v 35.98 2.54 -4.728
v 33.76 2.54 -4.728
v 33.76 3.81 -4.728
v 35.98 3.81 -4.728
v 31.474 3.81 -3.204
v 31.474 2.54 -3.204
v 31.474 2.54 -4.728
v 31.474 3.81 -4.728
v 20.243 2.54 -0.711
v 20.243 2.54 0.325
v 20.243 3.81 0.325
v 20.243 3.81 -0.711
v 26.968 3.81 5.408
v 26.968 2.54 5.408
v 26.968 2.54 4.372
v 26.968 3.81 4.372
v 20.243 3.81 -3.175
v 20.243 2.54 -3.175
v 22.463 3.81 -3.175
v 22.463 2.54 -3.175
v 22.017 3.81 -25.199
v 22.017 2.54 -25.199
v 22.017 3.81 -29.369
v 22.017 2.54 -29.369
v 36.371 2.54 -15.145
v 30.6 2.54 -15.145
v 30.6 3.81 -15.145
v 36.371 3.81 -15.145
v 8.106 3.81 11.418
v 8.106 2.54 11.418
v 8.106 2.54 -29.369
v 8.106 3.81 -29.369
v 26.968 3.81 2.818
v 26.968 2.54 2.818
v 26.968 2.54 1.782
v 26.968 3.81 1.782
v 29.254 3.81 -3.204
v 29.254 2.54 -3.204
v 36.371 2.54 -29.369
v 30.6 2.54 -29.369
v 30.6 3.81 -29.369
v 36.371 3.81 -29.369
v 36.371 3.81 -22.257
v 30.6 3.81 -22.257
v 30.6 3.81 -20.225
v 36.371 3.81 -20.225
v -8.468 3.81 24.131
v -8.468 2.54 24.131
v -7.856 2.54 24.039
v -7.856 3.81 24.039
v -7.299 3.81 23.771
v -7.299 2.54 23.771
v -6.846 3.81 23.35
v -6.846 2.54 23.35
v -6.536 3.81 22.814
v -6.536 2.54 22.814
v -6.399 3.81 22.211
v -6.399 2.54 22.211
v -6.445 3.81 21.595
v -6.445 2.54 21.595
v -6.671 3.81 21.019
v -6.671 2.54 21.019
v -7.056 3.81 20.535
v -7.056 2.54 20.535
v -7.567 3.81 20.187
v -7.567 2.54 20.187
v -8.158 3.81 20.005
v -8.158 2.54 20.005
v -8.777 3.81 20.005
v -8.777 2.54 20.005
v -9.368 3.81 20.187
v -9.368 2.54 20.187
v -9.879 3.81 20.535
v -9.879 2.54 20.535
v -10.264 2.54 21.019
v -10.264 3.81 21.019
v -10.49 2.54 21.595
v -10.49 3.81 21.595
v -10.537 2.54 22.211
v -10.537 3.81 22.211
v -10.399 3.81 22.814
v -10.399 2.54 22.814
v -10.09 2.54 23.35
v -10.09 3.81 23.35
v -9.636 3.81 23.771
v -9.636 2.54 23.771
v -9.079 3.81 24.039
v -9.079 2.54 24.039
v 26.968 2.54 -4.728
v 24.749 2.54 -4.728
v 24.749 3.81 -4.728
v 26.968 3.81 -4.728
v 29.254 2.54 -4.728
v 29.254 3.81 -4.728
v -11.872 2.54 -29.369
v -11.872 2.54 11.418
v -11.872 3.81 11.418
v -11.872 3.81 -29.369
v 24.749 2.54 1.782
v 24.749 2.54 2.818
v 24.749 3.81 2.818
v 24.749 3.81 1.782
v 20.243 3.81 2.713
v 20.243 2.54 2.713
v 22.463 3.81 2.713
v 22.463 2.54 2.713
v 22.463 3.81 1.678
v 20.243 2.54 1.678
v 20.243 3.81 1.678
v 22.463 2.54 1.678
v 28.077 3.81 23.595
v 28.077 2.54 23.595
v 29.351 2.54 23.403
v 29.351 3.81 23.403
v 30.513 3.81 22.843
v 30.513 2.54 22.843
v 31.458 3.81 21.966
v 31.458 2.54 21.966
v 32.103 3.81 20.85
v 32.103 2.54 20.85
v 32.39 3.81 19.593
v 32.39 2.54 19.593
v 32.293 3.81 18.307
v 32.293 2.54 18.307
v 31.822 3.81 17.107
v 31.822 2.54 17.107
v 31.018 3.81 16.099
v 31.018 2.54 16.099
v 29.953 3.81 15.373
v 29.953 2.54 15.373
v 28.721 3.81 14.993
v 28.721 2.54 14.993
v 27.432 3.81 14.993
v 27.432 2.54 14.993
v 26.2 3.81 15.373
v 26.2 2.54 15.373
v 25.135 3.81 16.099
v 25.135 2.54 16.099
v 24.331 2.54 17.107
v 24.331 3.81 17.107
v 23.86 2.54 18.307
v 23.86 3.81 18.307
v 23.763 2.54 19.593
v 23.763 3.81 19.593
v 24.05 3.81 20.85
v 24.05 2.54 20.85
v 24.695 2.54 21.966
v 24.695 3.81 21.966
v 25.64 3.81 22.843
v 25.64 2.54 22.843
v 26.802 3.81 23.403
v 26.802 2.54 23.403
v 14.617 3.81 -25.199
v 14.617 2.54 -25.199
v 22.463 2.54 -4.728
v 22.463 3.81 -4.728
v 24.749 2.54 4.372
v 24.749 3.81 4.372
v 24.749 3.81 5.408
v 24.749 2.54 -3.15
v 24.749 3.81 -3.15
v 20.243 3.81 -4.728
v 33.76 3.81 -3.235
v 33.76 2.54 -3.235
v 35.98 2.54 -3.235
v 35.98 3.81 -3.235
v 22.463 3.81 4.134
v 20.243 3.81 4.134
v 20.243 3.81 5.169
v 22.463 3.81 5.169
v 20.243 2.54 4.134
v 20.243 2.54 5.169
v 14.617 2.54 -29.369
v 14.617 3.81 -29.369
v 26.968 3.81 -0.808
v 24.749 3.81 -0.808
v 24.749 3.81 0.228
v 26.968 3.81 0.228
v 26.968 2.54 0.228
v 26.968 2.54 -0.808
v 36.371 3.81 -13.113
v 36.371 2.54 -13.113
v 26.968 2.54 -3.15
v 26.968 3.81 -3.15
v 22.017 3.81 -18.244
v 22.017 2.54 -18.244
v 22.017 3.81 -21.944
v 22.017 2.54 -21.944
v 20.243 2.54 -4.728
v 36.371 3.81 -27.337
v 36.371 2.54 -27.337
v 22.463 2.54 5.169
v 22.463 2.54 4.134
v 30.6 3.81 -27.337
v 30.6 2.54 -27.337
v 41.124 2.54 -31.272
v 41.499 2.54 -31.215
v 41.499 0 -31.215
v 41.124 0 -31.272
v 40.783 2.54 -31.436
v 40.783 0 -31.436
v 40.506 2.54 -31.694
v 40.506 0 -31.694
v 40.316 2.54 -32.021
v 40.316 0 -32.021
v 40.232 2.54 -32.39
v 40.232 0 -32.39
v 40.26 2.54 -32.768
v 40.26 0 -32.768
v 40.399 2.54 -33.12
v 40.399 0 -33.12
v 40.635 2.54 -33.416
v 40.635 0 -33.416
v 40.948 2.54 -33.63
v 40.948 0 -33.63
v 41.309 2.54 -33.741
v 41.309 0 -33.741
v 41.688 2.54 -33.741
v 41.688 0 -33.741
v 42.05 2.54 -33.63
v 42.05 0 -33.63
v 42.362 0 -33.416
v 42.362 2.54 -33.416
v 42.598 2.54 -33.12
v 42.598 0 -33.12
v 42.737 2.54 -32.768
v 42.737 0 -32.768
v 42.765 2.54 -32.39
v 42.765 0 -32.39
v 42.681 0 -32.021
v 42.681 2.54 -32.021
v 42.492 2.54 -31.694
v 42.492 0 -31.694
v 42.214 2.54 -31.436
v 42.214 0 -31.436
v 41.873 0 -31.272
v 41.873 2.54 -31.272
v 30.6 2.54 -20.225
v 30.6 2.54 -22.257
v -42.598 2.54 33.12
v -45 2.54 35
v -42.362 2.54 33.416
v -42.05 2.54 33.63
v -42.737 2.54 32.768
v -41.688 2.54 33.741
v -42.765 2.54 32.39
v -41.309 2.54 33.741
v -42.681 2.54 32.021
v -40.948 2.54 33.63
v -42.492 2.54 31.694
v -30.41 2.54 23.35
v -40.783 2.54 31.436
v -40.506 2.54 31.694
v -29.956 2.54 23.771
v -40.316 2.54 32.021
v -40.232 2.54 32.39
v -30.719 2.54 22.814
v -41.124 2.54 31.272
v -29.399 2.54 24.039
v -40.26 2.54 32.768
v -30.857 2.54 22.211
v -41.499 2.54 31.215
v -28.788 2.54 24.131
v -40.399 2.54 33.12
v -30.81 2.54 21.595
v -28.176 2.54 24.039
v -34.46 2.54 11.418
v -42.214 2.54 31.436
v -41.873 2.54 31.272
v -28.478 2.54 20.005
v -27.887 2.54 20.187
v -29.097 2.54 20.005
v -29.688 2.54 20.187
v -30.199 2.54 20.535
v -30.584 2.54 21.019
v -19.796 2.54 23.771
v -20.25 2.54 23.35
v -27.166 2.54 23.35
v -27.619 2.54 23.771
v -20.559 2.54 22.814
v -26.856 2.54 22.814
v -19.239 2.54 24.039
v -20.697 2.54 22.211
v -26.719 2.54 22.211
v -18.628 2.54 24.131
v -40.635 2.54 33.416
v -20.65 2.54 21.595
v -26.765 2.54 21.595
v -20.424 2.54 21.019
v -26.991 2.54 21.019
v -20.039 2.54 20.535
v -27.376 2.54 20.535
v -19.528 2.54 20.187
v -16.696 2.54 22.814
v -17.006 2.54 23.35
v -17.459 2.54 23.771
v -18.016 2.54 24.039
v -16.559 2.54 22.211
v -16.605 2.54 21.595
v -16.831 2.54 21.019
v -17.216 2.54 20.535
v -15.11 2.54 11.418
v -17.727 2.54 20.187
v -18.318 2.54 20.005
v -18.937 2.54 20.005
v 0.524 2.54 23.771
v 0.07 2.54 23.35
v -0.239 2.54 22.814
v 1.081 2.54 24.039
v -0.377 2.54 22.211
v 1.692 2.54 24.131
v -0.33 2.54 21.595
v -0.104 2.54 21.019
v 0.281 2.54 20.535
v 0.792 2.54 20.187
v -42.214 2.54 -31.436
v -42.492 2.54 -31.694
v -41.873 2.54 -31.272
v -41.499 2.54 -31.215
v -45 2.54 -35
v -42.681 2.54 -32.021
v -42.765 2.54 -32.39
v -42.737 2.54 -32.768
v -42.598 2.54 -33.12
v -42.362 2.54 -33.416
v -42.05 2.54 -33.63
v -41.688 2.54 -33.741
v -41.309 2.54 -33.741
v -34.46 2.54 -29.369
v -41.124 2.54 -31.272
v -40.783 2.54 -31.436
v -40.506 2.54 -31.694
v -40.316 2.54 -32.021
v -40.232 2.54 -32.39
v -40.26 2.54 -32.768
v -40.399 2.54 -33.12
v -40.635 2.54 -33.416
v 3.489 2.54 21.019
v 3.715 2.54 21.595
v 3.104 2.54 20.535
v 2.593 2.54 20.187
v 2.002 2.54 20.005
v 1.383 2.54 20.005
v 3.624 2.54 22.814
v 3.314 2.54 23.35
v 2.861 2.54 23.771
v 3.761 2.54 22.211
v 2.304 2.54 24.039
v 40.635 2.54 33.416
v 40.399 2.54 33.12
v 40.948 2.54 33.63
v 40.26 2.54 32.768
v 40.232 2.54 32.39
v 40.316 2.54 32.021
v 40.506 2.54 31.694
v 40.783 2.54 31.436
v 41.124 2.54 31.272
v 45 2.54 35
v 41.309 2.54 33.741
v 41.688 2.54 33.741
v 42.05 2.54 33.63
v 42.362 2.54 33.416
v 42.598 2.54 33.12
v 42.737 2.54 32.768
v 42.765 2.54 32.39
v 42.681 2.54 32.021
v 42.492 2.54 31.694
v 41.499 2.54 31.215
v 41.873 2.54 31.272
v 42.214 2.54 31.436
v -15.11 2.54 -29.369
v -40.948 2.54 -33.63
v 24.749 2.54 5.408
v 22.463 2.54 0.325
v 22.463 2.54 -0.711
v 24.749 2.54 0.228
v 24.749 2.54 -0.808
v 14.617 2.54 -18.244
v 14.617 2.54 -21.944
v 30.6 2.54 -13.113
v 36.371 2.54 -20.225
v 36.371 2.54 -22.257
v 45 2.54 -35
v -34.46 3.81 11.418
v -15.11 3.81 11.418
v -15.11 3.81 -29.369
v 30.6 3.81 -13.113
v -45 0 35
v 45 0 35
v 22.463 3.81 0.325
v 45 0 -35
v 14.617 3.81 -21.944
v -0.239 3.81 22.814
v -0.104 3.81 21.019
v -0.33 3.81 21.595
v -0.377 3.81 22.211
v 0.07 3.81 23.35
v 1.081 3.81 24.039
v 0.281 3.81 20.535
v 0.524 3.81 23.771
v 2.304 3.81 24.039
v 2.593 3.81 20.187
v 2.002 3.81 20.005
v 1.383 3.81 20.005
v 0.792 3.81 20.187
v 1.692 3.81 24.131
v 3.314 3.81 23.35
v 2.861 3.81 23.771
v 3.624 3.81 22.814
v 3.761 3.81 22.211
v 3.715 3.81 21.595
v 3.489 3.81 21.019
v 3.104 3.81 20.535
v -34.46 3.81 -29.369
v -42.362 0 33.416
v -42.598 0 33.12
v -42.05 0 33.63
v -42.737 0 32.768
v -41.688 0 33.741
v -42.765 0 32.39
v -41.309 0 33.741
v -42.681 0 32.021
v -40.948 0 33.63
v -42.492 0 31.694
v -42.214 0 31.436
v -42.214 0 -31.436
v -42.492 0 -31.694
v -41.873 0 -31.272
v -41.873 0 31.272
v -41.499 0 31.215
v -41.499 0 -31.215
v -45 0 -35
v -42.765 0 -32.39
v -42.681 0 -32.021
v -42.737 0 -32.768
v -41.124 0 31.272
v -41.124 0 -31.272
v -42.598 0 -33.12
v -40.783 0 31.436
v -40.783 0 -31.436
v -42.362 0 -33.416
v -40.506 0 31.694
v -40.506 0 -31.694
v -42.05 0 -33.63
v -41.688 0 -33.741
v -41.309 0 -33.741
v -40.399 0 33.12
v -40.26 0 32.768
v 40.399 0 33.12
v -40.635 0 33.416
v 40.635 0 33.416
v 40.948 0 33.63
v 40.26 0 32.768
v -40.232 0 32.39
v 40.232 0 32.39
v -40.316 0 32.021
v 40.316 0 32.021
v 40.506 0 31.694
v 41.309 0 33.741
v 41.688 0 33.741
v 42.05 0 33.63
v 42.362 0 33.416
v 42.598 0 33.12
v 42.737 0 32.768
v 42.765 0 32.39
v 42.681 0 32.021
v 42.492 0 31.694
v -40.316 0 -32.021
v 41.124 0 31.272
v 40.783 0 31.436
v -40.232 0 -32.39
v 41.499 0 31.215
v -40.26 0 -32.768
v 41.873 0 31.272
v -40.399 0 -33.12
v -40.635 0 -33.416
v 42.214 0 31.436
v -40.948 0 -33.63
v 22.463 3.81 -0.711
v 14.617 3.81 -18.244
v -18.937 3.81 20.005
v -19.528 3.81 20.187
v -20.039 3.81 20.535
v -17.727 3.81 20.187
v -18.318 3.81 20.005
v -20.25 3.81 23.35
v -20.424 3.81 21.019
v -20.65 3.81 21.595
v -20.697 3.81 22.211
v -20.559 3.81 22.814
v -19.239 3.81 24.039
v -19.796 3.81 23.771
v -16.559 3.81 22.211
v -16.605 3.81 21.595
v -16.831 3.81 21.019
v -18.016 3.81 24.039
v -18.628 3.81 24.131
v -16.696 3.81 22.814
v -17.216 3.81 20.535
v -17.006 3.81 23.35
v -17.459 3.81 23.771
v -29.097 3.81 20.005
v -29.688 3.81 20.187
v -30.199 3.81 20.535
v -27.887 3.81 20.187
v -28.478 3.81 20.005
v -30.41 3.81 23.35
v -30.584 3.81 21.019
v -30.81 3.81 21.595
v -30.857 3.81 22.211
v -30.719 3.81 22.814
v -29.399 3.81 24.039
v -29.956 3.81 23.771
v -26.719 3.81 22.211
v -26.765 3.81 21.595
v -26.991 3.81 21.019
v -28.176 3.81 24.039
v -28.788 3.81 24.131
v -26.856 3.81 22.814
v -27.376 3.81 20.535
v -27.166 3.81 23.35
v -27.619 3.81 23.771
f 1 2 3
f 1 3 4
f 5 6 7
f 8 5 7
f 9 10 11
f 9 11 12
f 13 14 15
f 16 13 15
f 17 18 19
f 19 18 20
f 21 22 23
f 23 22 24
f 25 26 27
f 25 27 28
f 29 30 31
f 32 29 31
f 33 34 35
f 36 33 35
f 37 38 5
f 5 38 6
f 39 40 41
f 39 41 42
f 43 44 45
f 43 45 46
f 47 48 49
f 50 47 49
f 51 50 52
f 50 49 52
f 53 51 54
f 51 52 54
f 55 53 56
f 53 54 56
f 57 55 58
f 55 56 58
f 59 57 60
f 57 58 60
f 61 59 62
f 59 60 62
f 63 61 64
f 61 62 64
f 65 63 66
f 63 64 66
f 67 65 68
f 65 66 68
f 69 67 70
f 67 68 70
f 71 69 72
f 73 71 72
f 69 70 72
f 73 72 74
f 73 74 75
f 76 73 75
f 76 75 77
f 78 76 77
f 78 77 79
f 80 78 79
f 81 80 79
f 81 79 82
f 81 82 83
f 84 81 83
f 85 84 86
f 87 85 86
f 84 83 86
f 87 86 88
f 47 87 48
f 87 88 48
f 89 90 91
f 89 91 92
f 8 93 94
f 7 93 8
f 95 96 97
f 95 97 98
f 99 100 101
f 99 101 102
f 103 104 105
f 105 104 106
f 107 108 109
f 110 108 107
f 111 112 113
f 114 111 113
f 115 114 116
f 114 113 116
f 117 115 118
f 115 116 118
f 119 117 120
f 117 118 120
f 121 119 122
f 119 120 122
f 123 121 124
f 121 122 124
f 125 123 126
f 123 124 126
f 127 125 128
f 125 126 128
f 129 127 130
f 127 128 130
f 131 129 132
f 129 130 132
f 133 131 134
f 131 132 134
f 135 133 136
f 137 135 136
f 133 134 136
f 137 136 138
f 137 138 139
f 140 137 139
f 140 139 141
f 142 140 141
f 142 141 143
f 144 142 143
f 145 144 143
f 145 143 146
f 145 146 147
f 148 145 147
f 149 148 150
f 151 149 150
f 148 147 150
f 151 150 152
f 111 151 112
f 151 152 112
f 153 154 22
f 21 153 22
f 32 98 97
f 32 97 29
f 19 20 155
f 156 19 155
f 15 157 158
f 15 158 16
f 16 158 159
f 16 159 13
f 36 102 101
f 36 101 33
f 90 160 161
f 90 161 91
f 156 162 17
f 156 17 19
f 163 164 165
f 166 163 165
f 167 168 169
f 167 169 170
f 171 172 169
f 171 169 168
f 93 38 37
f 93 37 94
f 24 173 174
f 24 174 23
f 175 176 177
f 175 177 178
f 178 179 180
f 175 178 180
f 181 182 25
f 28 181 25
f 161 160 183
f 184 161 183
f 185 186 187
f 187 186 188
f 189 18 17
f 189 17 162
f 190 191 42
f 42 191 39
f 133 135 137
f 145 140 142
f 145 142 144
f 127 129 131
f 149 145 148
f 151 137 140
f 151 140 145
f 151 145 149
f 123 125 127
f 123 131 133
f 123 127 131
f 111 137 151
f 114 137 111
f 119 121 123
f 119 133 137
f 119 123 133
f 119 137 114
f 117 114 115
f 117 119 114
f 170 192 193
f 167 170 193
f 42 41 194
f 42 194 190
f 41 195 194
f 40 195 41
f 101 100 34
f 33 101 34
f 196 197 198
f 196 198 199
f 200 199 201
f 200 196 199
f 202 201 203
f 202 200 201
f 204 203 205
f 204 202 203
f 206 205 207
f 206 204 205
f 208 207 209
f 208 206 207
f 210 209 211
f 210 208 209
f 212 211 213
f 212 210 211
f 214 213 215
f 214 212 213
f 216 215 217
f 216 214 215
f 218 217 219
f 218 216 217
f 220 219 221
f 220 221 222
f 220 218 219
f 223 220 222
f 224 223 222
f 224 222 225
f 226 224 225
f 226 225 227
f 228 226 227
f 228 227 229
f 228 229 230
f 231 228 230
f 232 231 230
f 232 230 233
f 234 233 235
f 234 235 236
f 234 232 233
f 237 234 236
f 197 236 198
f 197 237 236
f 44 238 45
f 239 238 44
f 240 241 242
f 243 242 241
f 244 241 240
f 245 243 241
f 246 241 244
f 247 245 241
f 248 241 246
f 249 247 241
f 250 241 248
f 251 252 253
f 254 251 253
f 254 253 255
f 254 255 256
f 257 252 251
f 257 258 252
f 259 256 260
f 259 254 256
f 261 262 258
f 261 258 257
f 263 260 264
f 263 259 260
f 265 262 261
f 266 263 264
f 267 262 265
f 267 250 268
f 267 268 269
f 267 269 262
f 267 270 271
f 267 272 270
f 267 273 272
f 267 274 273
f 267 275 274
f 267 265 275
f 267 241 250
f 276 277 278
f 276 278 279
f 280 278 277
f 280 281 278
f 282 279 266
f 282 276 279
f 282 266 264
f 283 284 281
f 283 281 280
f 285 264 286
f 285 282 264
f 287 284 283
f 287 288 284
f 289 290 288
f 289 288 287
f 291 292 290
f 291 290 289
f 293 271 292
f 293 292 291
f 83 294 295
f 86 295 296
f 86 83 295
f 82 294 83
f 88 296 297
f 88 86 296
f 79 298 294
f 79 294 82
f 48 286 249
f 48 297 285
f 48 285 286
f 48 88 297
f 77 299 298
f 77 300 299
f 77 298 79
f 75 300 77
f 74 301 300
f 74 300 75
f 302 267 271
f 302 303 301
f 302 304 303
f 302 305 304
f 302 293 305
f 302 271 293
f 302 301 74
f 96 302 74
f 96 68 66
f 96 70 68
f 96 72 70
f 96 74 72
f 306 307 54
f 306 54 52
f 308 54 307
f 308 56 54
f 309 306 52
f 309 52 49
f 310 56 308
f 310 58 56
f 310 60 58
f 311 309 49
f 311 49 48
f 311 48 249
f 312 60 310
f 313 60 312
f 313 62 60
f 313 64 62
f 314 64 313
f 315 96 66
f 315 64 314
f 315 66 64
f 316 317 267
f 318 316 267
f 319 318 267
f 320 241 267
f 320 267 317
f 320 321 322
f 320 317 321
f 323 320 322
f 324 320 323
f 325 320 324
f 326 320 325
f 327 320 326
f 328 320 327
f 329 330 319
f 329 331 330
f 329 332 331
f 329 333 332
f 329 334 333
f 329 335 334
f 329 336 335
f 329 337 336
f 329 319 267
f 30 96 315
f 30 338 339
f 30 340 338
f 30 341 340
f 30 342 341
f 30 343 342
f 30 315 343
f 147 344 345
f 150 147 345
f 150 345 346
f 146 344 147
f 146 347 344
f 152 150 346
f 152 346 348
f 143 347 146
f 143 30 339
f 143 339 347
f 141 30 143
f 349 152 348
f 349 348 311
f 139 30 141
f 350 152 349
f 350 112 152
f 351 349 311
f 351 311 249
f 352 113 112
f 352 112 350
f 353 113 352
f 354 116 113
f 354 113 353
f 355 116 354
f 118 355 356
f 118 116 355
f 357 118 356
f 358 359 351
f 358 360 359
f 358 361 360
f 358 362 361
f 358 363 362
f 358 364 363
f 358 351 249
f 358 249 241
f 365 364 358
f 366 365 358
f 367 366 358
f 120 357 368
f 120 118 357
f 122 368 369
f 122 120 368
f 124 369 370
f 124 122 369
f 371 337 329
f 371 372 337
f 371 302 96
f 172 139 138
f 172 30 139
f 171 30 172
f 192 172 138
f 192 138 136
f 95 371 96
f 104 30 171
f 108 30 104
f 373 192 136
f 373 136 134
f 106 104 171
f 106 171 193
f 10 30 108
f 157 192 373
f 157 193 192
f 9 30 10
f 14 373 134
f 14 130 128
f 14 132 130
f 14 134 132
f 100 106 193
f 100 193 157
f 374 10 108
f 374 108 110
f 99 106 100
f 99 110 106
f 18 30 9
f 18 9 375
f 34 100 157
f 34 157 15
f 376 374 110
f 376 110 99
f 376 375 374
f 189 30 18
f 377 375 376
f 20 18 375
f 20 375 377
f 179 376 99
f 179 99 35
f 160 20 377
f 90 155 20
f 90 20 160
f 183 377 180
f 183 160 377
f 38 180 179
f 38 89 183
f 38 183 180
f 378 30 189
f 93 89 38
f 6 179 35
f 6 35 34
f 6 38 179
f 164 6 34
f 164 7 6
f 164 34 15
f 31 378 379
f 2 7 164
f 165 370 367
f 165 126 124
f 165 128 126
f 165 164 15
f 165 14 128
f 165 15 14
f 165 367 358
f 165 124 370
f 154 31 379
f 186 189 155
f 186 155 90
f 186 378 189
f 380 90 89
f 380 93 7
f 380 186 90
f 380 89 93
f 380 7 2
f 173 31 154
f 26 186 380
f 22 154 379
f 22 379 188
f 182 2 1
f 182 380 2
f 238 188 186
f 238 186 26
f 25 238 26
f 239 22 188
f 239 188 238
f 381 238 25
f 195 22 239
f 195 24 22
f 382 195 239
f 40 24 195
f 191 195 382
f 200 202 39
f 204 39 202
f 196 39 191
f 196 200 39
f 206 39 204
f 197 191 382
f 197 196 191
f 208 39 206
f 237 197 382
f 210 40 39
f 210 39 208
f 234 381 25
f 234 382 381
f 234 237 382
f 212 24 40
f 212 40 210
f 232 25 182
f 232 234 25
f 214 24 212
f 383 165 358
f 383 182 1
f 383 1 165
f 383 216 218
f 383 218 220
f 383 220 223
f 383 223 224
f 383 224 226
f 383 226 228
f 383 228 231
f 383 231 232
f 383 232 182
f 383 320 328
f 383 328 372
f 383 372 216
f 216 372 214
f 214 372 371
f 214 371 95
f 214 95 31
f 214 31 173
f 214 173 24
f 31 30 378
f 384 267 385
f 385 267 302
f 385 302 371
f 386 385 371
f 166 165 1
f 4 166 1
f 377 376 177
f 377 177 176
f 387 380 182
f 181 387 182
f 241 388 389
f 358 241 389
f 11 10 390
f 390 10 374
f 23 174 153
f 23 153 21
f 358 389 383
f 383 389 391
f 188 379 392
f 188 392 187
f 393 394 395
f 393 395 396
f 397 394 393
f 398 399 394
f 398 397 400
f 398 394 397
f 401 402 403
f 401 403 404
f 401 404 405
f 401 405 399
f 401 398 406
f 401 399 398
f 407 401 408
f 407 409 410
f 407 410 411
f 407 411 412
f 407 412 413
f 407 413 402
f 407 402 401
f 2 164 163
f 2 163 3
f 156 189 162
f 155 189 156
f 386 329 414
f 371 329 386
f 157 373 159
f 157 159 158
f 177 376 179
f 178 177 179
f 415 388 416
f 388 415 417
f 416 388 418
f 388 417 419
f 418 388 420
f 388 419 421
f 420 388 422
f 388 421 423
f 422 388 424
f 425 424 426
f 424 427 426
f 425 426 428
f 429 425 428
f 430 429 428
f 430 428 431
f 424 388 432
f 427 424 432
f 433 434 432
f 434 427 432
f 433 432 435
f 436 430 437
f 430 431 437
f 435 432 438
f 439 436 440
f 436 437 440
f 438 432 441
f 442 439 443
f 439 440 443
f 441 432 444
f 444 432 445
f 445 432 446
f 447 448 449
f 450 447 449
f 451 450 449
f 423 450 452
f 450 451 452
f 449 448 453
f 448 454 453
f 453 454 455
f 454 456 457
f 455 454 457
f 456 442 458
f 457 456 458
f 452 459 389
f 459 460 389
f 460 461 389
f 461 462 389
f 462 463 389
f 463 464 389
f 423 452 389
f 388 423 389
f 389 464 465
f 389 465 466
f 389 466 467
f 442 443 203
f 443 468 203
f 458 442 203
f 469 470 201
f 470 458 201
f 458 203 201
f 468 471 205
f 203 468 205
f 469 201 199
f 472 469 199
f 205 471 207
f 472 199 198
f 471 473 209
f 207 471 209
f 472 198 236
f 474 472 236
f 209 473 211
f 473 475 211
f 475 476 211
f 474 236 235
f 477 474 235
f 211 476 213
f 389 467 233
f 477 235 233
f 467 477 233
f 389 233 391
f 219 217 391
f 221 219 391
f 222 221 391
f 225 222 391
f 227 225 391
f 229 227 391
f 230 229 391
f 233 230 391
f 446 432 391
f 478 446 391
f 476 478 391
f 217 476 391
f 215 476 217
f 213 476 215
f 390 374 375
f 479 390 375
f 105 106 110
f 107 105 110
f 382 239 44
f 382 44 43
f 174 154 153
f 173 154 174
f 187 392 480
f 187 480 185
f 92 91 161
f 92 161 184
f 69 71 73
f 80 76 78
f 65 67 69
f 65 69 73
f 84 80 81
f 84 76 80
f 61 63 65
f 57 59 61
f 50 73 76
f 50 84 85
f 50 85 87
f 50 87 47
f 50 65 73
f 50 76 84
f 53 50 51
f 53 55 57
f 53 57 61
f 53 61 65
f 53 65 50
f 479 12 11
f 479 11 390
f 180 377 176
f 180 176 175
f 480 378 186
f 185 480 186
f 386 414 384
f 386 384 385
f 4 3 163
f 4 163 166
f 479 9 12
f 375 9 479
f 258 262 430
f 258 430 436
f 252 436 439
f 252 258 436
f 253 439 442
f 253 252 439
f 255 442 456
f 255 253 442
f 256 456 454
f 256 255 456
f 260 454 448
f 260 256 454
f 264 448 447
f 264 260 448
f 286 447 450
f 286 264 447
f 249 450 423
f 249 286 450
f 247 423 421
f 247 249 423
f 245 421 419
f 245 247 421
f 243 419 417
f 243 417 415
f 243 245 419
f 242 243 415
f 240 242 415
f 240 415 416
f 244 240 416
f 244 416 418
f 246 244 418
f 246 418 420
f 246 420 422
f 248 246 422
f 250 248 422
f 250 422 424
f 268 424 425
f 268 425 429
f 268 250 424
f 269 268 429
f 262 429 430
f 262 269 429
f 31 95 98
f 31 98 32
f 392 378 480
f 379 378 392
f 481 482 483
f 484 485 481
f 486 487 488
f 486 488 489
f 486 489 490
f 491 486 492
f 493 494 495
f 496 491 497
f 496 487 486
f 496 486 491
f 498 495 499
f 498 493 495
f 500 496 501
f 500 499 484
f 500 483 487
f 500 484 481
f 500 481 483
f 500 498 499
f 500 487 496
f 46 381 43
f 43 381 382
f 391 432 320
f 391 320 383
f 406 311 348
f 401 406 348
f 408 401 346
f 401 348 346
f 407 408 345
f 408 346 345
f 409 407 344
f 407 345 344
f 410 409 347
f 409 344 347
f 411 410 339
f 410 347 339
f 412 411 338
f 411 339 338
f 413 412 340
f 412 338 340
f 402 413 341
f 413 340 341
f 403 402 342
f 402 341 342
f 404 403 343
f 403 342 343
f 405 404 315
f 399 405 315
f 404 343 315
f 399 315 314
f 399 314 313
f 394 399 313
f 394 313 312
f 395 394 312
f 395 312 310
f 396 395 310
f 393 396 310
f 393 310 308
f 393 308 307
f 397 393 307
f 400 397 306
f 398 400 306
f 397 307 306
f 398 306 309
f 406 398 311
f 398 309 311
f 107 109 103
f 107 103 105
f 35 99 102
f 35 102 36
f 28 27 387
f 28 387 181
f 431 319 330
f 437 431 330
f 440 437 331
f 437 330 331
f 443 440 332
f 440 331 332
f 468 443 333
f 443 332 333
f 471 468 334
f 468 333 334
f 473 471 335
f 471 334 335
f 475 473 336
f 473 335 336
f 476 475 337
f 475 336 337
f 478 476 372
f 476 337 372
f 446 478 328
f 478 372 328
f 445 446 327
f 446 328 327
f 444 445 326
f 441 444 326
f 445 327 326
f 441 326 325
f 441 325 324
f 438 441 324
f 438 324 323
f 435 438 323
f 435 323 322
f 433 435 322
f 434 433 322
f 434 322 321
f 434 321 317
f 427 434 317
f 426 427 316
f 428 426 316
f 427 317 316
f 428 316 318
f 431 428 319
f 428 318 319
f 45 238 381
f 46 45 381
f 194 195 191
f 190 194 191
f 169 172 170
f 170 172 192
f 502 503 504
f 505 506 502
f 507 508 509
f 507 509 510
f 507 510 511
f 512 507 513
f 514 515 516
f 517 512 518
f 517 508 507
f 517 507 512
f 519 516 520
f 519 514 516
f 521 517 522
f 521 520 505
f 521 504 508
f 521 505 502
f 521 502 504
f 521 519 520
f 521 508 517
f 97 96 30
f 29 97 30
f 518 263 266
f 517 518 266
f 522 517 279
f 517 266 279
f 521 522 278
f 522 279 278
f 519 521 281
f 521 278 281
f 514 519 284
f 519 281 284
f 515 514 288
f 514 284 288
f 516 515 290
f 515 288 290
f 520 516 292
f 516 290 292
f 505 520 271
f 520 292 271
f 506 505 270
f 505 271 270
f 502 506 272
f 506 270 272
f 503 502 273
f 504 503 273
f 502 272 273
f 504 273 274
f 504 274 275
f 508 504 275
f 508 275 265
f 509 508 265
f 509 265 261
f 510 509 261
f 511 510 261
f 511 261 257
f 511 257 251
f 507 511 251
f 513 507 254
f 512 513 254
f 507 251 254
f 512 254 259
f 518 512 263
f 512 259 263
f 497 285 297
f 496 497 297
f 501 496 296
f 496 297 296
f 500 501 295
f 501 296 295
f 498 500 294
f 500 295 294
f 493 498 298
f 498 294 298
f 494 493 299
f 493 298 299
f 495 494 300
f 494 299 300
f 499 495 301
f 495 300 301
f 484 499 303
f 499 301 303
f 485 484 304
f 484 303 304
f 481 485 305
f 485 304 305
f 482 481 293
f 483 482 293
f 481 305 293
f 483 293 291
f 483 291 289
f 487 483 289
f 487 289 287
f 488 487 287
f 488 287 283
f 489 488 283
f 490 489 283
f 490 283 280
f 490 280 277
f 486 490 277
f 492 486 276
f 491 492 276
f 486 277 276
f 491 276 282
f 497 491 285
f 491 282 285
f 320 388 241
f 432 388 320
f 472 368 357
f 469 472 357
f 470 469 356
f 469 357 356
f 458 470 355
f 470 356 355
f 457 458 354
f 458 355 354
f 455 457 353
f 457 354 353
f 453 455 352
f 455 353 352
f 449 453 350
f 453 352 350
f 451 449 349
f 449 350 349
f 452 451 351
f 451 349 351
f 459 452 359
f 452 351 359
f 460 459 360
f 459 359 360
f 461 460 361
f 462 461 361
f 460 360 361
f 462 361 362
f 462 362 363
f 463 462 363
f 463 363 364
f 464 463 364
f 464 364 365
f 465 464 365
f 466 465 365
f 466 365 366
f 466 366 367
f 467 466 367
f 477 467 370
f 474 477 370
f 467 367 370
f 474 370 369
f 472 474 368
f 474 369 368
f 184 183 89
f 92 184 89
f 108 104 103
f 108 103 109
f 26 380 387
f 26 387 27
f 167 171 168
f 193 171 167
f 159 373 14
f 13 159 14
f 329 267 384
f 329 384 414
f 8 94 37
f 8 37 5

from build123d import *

# Parameters (mm, degrees)
SKETCH1_W               = 90
SKETCH1_H               = 70
BOSS_EXTRUDE1_DEPTH     = 2.54
SKETCH2_R               = 2.074775273
SKETCH2_R_2             = 4.325167344
SKETCH2_W               = 2.219761911
SKETCH2_H               = 1.524543627
SKETCH2_W_2             = 19.349952437
SKETCH2_H_2             = 40.787411984
SKETCH2_W_3             = 19.977857201
SKETCH2_W_4             = 7.399206371
SKETCH2_H_3             = 4.17028531
SKETCH2_H_4             = 3.699603186
SKETCH2_W_5             = 5.771380969
SKETCH2_H_5             = 2.032
SKETCH2_H_6             = 1.035888892
SKETCH2_W_6             = 2.219761912
SKETCH2_H_7             = 1.578831572
SKETCH2_H_8             = 1.553833338
SKETCH2_H_9             = 1.493763587
BOSS_EXTRUDE2_DEPTH     = 1.27
SKETCH3_R               = 1.27
CUT_EXTRUDE1_DEPTH      = 2.54
MIRROR2_COPY_1_SKETCH_R = 1.27
MIRROR2_COPY_1_DEPTH    = 2.54


with BuildPart() as part:
    # Sketch1 → Boss-Extrude1 (new body)
    with BuildSketch(Plane(origin=(0, 0, 0), x_dir=(1, 0, 0), z_dir=(0, 1, 0))):
        Rectangle(SKETCH1_W, SKETCH1_H)
    extrude(amount=BOSS_EXTRUDE1_DEPTH)

    # Sketch2 → Boss-Extrude2 (add)
    with BuildSketch(Plane(origin=(0, 2.54, 0), x_dir=(1, 0, 0), z_dir=(0, 1, 0))):
        with Locations(Location((-28.787636227, -22.056380876, 0), (0, 0, 270))):
            Circle(SKETCH2_R)
        with Locations(Location((-18.627636227, -22.056380876, 0), (0, 0, 270))):
            Circle(SKETCH2_R)
        with Locations(Location((-8.467636227, -22.056380876, 0), (0, 0, 270))):
            Circle(SKETCH2_R)
        with Locations(Location((1.692363773, -22.056380876, 0), (0, 0, 270))):
            Circle(SKETCH2_R)
        with Locations(Location((28.076508074, -19.269666276, 0), (0, 0, 270))):
            Circle(SKETCH2_R_2)
        with Locations((30.364354819, 3.966137277)):
            Rectangle(SKETCH2_W, SKETCH2_H)
        with Locations((-24.784583824, 8.975791822)):
            Rectangle(SKETCH2_W_2, SKETCH2_H_2)
        with Locations((-1.882735108, 8.975791822)):
            Rectangle(SKETCH2_W_3, SKETCH2_H_2)
        with Locations((18.317098286, 27.284355159)):
            Rectangle(SKETCH2_W_4, SKETCH2_H_3)
        with Locations((18.317098286, 20.093760108)):
            Rectangle(SKETCH2_W_4, SKETCH2_H_4)
        with Locations((33.485471346, 28.353497814)):
            Rectangle(SKETCH2_W_5, SKETCH2_H_5)
        with Locations((33.485471346, 21.241497814)):
            Rectangle(SKETCH2_W_5, SKETCH2_H_5)
        with Locations((33.485471346, 14.129497814)):
            Rectangle(SKETCH2_W_5, SKETCH2_H_5)
        with Locations((21.352830995, 0.193252065)):
            Rectangle(SKETCH2_W, SKETCH2_H_6)
        with Locations((25.858592907, 3.938993304)):
            Rectangle(SKETCH2_W_6, SKETCH2_H_7)
        with Locations((21.352830995, 3.951492421)):
            Rectangle(SKETCH2_W, SKETCH2_H_8)
        with Locations((34.870116729, 3.981527297)):
            Rectangle(SKETCH2_W, SKETCH2_H_9)
        with Locations((21.352830995, -2.195488046)):
            Rectangle(SKETCH2_W, SKETCH2_H_6)
        with Locations((21.352830995, -4.651515111)):
            Rectangle(SKETCH2_W, SKETCH2_H_6)
        with Locations((25.858592907, 0.289779343)):
            Rectangle(SKETCH2_W_6, SKETCH2_H_6)
        with Locations((25.858592907, -2.300212834)):
            Rectangle(SKETCH2_W_6, SKETCH2_H_6)
        with Locations((25.858592907, -4.890205011)):
            Rectangle(SKETCH2_W_6, SKETCH2_H_6)
    extrude(amount=BOSS_EXTRUDE2_DEPTH)

    # Sketch3 → Cut-Extrude1 (cut)
    with BuildSketch(Plane(origin=(0, 2.54, 0), x_dir=(1, 0, 0), z_dir=(0, 1, 0))):
        with Locations(Location((-41.49861, 32.4854, 0), (0, 0, 270))):
            Circle(SKETCH3_R)
    cut_extrude1 = extrude(amount=-CUT_EXTRUDE1_DEPTH, mode=Mode.SUBTRACT)

    # Mirror1: Cut-Extrude1 across plane
    add(cut_extrude1.mirror(Plane(origin=(0, 0, 0), x_dir=(1, 0, 0), z_dir=(0, 0, -1))), mode=Mode.SUBTRACT)

    # Mirror2: Cut-Extrude1 across plane
    add(cut_extrude1.mirror(Plane.ZY), mode=Mode.SUBTRACT)

    # Mirror2 copy 1 sketch → Mirror2 copy 1 (cut)
    with BuildSketch(Plane(origin=(0, 2.54, 0), x_dir=(-1, 0, 0), z_dir=(0, 1, 0))):
        with Locations(Location((-41.49861, 32.4854, 0), (0, 0, 270))):
            Circle(MIRROR2_COPY_1_SKETCH_R)
    extrude(amount=-MIRROR2_COPY_1_DEPTH, mode=Mode.SUBTRACT)


solid = part.part
